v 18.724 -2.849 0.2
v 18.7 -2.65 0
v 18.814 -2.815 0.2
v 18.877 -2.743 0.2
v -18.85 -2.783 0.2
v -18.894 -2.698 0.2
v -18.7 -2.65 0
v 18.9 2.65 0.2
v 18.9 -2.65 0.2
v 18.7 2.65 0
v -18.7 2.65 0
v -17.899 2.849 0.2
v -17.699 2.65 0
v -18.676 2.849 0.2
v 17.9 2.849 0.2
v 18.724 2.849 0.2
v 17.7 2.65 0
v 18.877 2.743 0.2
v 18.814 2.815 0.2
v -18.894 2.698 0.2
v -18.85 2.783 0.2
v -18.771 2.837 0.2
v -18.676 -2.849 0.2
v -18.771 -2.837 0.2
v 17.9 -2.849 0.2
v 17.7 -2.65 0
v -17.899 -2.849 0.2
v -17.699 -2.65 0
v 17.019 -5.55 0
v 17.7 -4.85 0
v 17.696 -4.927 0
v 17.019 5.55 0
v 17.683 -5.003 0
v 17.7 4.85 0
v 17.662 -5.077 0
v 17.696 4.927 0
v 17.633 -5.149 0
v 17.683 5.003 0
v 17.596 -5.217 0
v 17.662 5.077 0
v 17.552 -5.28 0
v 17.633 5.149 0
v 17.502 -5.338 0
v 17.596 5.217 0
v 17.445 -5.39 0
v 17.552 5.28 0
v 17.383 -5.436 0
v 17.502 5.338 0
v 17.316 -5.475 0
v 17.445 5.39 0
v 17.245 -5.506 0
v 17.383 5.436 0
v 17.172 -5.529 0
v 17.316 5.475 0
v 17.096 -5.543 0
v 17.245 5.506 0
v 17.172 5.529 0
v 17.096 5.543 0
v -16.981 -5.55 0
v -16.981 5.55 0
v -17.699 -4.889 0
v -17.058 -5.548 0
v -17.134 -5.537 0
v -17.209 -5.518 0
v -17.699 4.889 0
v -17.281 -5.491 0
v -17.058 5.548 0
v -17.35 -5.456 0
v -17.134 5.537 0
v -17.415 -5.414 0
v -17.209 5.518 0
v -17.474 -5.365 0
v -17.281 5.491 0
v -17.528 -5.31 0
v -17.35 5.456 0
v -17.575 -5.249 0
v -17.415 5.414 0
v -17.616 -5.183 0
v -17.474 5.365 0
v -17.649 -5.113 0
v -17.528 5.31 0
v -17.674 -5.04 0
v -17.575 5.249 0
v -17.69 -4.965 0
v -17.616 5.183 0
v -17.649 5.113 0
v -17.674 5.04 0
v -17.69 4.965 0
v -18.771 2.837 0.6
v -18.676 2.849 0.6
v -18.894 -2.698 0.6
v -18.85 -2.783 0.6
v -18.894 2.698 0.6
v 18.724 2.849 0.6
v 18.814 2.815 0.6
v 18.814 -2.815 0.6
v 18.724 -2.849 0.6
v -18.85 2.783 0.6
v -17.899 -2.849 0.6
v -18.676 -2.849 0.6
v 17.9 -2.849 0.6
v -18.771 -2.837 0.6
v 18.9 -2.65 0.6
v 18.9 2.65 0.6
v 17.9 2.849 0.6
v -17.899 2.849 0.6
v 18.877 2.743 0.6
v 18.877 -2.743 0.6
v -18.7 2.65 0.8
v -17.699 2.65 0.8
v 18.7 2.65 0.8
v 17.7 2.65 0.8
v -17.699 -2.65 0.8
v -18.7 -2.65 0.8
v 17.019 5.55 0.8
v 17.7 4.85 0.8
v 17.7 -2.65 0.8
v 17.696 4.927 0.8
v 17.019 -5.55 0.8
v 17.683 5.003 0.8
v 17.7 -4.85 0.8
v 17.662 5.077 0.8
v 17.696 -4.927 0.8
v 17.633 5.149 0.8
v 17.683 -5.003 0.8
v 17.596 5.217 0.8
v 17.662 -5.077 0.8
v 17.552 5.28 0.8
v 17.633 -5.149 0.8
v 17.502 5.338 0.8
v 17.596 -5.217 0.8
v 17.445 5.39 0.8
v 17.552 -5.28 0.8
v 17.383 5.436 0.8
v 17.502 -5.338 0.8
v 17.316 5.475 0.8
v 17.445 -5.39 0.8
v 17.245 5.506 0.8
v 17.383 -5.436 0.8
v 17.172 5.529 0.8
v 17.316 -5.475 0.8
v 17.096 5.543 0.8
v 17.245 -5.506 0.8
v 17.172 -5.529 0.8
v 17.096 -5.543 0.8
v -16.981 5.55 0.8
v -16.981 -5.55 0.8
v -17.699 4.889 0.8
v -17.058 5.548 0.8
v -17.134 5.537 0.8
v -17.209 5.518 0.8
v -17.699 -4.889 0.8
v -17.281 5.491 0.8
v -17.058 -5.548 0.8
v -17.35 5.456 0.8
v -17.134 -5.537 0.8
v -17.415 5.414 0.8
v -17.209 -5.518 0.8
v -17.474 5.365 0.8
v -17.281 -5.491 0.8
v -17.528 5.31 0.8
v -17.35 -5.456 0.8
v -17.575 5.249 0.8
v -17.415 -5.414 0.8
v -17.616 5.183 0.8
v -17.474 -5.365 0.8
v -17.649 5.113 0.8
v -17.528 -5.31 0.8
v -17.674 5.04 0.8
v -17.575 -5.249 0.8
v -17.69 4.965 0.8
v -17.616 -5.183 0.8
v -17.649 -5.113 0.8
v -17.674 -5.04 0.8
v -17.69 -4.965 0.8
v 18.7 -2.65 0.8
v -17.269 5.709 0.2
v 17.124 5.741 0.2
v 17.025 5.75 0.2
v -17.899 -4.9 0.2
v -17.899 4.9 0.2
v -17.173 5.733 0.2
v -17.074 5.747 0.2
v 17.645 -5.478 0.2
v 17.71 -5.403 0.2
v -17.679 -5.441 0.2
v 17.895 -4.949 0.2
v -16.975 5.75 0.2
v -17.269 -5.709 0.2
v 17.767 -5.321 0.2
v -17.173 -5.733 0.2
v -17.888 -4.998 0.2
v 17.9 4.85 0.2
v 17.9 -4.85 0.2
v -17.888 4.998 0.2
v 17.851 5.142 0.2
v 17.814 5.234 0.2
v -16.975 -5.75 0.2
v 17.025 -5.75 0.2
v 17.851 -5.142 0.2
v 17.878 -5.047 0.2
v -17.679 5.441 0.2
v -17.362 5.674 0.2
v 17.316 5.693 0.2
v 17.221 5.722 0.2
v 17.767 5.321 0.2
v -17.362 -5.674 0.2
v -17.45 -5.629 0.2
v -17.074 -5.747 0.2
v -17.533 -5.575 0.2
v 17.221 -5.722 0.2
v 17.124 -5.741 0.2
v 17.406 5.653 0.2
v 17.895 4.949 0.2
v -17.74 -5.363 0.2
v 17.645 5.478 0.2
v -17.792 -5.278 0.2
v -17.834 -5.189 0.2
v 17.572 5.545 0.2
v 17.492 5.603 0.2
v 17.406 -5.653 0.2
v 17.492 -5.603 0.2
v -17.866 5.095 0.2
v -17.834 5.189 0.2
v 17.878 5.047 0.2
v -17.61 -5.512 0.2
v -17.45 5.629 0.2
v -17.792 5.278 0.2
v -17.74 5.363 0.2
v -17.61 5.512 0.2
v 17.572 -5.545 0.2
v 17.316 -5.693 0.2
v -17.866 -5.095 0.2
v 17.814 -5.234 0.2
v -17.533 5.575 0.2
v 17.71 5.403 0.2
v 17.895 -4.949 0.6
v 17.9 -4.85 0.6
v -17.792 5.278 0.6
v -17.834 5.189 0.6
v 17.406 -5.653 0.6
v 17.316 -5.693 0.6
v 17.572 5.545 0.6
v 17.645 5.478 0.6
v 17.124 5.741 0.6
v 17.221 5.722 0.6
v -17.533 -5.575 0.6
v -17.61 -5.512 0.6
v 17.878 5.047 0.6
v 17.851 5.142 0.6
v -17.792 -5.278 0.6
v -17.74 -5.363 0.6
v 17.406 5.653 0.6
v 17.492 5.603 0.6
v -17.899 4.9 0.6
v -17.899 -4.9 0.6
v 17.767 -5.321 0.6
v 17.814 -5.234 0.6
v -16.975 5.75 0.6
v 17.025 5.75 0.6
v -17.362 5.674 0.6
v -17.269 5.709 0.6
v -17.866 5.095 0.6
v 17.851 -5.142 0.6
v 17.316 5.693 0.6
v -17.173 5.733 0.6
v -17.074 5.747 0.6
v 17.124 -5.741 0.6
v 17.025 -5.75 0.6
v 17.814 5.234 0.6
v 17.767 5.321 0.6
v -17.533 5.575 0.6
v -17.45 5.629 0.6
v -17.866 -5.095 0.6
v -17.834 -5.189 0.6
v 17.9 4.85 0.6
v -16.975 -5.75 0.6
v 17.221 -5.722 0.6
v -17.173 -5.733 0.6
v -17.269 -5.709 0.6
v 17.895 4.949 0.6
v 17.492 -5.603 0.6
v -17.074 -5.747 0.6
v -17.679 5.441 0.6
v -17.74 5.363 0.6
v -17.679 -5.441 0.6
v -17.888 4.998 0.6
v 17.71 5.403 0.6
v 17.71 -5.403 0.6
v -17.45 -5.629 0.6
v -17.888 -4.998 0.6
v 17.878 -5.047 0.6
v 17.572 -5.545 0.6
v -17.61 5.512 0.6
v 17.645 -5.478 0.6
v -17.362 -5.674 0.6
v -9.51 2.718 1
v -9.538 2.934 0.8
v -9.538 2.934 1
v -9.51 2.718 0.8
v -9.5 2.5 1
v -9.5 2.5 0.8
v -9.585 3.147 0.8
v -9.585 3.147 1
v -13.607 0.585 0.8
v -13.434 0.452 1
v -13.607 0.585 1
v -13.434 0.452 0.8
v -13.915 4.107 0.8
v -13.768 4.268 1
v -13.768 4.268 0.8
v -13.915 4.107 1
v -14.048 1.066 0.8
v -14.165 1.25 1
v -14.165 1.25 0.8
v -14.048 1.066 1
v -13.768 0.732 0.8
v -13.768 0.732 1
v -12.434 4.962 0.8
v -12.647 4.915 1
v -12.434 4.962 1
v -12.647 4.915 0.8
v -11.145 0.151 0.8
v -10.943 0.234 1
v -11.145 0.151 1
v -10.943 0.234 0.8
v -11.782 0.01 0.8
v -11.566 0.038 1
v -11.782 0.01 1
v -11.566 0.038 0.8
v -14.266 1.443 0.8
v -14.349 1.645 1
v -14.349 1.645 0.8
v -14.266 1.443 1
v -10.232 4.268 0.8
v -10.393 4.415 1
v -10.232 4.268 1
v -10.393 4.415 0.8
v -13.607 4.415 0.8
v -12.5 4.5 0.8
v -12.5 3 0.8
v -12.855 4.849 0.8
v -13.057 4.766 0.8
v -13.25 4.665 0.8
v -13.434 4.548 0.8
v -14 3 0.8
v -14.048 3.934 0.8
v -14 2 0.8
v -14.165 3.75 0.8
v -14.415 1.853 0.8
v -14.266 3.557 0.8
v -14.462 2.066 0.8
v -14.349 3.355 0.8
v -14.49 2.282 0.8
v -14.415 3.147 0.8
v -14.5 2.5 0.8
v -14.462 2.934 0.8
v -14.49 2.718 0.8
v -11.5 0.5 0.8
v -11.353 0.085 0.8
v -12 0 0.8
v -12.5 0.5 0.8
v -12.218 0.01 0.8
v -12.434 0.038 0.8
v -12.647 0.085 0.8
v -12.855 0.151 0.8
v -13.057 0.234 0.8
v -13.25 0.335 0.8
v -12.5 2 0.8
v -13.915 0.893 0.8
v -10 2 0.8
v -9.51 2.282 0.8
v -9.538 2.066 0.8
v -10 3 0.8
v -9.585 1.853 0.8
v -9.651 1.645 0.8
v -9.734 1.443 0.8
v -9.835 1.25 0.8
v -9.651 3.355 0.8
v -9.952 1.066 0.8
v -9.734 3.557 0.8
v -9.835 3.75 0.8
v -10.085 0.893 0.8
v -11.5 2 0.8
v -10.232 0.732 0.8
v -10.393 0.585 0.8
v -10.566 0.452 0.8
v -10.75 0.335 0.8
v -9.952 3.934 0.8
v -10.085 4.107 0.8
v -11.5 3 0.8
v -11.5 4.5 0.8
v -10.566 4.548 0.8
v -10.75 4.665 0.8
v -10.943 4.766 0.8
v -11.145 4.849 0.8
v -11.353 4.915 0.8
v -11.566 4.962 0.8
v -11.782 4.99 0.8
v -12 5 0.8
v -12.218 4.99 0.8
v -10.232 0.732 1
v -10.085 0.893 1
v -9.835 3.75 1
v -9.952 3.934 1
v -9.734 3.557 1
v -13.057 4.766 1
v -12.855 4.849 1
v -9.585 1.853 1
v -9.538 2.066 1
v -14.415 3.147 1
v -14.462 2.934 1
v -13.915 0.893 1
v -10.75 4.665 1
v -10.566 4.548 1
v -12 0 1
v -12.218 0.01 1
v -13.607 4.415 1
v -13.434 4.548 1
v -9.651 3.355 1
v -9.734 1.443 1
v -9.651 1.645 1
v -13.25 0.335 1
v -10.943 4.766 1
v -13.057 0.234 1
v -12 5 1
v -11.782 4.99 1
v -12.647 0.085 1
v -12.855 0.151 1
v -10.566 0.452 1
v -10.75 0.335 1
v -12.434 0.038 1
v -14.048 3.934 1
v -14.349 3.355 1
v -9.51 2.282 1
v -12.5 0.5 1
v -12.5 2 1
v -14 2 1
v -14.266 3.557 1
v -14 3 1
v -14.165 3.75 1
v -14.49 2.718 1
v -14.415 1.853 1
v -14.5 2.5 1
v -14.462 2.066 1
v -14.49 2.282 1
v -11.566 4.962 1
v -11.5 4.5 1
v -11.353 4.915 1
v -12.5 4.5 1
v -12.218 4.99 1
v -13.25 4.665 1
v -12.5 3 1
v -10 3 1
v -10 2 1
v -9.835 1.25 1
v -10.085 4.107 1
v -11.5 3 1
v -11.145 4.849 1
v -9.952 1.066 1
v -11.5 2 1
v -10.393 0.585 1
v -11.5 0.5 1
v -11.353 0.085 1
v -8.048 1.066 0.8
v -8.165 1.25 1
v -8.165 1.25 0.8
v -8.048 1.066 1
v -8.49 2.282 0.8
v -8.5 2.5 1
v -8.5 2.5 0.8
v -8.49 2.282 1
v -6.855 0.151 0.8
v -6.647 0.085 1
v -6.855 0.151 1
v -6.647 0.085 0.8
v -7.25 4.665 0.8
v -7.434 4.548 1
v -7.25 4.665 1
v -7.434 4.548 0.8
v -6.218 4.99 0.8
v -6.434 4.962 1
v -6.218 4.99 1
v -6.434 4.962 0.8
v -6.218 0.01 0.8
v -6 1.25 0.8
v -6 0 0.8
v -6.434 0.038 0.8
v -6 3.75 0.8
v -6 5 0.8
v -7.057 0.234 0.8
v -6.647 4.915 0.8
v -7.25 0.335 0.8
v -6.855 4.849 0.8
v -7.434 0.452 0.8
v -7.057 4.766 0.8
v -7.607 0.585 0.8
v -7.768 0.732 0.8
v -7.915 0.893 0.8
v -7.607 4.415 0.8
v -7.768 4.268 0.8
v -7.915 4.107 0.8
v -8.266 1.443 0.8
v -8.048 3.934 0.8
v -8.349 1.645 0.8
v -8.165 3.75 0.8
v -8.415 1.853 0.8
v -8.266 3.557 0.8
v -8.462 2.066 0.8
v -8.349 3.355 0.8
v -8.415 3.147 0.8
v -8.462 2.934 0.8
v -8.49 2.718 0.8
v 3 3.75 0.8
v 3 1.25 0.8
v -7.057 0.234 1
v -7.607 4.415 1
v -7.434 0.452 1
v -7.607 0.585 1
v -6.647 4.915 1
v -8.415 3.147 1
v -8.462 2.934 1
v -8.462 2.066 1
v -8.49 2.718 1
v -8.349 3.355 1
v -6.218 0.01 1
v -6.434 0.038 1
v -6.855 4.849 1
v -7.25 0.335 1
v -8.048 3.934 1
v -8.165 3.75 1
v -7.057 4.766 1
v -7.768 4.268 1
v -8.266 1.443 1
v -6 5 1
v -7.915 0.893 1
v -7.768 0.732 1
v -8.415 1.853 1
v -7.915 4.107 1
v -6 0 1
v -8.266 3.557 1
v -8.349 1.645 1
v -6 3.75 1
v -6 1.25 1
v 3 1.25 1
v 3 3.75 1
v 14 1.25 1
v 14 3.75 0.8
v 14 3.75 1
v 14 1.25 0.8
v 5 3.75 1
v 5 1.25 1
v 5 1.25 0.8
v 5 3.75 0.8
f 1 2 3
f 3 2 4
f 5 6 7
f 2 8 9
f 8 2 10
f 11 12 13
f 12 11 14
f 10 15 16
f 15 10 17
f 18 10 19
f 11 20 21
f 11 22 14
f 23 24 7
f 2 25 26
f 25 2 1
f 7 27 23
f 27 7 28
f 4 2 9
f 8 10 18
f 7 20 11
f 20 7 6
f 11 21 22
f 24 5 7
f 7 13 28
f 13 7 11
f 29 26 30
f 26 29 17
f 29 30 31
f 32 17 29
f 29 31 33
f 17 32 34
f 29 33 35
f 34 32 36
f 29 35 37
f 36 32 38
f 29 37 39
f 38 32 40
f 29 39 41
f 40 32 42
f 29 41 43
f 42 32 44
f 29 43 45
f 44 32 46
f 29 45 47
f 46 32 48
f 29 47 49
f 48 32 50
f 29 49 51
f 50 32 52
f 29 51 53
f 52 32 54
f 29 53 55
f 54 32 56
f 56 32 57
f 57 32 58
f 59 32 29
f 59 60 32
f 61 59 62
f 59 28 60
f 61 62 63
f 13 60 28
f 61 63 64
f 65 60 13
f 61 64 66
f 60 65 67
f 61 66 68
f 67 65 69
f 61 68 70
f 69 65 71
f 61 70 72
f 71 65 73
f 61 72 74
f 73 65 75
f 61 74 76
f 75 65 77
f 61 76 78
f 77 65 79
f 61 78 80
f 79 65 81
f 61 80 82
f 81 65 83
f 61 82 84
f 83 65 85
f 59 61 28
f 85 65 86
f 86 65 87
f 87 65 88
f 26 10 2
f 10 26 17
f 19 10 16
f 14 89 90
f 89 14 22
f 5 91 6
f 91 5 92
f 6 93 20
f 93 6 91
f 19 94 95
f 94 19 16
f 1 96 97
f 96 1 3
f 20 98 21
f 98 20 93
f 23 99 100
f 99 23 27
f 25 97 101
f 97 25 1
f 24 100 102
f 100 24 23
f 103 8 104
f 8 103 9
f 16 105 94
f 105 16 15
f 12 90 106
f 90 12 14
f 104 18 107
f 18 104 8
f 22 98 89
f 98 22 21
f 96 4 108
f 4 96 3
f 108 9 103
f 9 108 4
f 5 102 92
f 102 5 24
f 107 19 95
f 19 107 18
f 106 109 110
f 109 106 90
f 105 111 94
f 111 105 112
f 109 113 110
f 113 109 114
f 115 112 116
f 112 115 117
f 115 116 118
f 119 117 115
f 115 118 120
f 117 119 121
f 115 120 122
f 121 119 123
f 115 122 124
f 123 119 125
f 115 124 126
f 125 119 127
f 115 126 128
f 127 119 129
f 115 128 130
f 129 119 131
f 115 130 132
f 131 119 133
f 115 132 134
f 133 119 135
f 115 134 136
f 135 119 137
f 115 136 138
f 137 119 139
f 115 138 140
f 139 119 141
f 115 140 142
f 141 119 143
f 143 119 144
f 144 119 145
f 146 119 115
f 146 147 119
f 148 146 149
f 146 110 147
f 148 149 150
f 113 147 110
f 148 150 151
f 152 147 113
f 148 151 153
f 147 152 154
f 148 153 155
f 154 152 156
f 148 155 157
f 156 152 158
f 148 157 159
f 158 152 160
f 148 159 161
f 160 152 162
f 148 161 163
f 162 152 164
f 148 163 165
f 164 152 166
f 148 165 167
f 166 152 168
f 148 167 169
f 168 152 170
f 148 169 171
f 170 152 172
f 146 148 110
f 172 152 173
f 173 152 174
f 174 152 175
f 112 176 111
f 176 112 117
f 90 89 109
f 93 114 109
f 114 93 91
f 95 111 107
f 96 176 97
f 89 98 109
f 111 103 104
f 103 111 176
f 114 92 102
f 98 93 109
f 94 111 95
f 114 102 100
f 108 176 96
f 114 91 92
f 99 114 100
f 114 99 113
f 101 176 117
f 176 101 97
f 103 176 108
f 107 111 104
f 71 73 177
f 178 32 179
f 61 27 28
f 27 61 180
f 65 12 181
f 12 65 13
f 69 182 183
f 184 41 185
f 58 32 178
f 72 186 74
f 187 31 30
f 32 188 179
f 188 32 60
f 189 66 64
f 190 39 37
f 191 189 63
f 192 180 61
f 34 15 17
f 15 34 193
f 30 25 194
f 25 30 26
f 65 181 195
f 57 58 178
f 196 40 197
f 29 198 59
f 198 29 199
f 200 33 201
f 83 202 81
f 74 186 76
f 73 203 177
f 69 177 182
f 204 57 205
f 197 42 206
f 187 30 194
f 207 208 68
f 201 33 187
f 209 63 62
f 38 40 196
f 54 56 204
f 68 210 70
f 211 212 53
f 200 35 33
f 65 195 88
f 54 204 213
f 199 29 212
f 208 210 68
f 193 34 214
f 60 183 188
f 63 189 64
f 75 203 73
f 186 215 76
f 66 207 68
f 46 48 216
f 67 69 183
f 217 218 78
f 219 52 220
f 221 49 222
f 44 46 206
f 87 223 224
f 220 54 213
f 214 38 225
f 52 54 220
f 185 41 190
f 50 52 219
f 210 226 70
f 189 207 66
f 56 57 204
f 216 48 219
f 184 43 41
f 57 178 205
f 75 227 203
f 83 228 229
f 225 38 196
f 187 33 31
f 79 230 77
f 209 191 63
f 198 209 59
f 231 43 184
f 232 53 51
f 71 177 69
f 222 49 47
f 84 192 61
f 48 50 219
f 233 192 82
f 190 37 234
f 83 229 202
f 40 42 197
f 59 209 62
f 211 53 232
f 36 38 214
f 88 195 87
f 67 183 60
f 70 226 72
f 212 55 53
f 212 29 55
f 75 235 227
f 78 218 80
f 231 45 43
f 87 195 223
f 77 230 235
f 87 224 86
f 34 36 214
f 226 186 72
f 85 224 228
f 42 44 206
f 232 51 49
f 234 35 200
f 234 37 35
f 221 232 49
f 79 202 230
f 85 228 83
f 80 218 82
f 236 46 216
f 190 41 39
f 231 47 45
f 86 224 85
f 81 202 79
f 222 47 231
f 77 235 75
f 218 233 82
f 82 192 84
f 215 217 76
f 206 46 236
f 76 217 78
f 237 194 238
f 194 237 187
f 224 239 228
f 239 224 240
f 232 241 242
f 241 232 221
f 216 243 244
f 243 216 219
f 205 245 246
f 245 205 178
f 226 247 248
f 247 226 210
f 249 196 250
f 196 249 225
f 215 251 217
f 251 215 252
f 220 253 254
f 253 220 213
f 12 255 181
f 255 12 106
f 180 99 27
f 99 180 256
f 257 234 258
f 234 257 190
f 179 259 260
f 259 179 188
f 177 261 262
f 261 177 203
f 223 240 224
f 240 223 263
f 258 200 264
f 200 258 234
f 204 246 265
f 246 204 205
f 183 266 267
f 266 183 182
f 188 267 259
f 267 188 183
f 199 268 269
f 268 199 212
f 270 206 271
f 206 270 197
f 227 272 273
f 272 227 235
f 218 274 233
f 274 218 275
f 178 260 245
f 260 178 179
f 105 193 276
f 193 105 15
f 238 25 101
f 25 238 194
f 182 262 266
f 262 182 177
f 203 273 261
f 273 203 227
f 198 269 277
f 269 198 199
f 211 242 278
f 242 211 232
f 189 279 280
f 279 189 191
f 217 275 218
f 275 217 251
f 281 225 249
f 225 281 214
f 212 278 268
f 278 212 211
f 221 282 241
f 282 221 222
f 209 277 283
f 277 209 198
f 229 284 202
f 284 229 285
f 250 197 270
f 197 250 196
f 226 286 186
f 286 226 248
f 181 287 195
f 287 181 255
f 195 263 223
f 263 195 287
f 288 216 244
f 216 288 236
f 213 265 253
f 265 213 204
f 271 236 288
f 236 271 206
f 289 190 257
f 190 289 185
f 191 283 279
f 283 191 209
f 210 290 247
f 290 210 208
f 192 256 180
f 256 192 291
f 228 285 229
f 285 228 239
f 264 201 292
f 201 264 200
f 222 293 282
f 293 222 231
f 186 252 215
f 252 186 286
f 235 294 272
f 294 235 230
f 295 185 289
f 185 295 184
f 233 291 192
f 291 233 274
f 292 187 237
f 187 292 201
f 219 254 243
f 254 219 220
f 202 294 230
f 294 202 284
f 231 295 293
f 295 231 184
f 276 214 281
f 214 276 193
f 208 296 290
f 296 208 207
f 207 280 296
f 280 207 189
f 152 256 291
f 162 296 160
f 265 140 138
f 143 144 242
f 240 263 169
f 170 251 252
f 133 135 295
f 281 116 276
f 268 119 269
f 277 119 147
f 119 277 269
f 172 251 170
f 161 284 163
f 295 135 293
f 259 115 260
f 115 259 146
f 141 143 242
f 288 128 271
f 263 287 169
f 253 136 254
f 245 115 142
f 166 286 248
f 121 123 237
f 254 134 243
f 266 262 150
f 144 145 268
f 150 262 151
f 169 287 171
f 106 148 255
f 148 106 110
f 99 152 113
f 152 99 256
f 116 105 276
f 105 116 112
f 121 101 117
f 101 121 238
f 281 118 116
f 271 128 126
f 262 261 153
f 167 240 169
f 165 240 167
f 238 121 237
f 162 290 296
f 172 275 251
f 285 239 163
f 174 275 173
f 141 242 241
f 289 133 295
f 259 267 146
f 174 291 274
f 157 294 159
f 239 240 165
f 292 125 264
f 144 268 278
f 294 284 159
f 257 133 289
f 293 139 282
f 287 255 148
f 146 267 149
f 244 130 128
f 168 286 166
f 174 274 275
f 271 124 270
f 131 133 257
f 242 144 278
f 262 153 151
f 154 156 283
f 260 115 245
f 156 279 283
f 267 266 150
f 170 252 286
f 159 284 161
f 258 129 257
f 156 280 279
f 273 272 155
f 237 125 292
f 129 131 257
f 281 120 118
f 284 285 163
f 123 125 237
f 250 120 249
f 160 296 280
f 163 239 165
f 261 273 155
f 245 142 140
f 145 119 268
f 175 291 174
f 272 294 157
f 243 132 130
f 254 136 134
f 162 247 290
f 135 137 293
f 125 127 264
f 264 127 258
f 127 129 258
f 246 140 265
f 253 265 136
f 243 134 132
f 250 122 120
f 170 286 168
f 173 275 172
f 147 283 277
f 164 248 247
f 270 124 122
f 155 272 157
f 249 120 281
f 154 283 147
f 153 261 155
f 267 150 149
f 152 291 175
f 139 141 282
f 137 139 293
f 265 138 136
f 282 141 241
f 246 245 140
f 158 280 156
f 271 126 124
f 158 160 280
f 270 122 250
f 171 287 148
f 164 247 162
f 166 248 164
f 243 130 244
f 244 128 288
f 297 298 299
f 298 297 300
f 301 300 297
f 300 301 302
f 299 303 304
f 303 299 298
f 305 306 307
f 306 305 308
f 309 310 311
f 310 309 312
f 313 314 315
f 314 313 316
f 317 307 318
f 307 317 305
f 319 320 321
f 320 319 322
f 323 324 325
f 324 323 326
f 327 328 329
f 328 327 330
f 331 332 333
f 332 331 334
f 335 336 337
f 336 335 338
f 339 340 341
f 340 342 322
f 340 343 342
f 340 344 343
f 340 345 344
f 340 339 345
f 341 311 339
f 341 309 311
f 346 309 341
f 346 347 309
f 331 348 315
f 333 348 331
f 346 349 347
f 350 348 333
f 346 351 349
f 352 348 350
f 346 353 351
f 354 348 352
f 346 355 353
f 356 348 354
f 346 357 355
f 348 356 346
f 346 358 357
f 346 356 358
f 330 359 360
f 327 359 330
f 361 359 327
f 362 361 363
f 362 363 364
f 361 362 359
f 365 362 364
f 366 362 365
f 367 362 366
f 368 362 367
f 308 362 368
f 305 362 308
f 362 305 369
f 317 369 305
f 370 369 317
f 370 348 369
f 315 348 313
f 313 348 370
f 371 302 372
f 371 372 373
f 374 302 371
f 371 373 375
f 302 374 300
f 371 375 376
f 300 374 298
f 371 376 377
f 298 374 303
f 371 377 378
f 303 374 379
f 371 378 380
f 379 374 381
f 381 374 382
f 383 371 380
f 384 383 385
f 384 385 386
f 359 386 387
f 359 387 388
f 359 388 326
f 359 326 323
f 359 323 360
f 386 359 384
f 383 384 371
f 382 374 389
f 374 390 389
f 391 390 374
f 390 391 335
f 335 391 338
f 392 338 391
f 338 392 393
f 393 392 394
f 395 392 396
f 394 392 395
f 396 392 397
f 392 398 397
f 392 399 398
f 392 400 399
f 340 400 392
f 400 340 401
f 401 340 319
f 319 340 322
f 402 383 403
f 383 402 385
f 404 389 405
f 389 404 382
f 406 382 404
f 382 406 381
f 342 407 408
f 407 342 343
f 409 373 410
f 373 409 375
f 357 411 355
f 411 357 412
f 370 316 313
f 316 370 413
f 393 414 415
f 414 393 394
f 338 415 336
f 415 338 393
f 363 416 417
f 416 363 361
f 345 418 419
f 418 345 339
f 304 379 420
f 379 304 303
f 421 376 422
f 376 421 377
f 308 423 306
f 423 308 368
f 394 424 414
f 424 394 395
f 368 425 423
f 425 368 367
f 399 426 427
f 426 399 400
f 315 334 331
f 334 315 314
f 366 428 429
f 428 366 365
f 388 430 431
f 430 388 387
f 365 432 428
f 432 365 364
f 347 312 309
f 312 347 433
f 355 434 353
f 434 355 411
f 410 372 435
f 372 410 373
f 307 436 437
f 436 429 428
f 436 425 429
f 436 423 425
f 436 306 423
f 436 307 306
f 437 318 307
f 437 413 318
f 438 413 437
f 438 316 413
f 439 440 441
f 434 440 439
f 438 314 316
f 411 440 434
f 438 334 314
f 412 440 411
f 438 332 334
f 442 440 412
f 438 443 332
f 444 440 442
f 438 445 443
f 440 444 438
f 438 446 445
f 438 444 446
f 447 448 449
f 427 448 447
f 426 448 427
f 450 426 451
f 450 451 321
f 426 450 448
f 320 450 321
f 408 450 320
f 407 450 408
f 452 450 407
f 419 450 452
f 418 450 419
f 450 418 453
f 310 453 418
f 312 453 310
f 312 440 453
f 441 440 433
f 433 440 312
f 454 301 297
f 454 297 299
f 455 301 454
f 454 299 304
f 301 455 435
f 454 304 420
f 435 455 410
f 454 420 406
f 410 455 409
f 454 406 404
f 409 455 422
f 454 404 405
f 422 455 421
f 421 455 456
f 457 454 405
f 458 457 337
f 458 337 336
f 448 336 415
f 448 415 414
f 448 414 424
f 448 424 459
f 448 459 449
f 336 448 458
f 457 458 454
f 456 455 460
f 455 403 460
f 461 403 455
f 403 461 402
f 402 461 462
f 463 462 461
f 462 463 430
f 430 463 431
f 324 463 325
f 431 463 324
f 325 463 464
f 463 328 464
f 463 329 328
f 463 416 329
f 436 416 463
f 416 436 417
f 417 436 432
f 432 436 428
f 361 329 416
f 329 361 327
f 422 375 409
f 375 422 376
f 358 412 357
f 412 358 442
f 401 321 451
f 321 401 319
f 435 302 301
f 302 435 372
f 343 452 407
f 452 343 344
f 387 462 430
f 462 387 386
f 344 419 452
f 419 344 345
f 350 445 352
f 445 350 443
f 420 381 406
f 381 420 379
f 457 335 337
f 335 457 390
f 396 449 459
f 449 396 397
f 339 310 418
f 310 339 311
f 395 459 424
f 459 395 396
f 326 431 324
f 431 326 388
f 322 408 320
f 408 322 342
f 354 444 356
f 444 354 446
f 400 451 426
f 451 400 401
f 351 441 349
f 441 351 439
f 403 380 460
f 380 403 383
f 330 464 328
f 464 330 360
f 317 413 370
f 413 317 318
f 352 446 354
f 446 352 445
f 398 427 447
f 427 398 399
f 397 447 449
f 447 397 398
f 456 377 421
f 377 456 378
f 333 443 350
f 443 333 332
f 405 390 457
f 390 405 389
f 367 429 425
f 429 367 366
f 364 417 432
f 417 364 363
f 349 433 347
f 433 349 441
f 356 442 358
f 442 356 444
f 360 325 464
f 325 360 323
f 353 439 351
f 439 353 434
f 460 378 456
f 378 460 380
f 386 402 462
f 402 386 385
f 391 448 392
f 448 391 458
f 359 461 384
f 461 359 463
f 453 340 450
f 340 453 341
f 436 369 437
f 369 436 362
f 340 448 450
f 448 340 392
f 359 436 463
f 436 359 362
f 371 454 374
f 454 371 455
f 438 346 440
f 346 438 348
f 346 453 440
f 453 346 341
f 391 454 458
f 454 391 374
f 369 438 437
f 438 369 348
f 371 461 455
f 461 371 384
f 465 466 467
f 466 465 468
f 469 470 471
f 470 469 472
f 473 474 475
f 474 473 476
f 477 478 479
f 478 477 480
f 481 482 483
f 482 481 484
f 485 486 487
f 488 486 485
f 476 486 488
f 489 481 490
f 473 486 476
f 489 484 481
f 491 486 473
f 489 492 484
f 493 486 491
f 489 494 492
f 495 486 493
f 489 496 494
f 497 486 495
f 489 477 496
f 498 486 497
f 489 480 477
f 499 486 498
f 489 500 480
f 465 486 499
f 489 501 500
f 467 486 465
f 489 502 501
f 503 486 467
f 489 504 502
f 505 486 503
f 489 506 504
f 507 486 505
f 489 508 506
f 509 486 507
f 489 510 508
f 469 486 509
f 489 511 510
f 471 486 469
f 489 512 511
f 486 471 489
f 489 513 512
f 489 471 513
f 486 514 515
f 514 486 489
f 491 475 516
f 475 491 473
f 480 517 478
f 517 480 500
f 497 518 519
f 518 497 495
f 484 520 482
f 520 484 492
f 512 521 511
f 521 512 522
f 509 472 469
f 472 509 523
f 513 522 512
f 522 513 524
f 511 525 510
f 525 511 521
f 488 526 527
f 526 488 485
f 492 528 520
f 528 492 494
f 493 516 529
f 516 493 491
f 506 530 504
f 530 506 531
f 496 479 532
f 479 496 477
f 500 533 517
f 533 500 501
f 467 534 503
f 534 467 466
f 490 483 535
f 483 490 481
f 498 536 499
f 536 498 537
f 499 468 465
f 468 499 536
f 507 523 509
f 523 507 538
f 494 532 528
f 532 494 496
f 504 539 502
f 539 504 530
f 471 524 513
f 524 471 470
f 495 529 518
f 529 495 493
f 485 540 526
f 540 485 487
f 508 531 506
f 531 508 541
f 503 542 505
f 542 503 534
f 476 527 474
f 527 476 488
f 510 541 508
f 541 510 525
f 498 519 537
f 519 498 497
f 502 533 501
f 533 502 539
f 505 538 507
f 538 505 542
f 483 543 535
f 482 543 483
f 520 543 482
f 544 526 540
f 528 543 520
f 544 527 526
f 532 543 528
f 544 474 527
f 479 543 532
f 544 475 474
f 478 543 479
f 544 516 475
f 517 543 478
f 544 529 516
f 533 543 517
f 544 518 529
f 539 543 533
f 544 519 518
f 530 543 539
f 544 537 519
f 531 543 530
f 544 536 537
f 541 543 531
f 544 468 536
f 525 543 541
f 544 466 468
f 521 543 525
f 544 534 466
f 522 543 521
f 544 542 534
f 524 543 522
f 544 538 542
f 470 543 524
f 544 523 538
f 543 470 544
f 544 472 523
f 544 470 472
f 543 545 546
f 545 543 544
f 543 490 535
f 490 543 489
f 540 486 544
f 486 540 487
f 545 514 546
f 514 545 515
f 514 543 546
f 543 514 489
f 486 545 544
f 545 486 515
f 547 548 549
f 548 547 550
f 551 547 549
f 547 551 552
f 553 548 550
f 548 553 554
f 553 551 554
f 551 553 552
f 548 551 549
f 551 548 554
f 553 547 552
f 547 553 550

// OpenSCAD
/////////////////////////////////////////////
// Custom label generator by Laurens Guijt //
/////////////////////////////////////////////

//////////////////////////////////////////////////////////////
//                   BATCH LABEL DATA                      //
//////////////////////////////////////////////////////////////

batch_label_data = [
    ["Dome head bolt", "M2", 8],
    ["Dome head bolt", "M2", 12],
    ["Dome head bolt", "M2", 16],
    ["Dome head bolt", "M2", 20],
    ["Dome head bolt", "M3", 8],
    ["Dome head bolt", "M3", 12],
    ["Dome head bolt", "M3", 16],
    ["Dome head bolt", "M3", 20],
    ["Dome head bolt", "M4", 8],
    ["Dome head bolt", "M4", 12],
    ["Dome head bolt", "M4", 16],
    ["Dome head bolt", "M4", 20],
    ["Dome head bolt", "M5", 8],
    ["Dome head bolt", "M5", 12],
    ["Dome head bolt", "M5", 16],
    ["Dome head bolt", "M5", 20],
    ["Standard nut", "M2", 0],
    ["Standard nut", "M3", 0],
    ["Standard nut", "M4", 0],
    ["Standard nut", "M5", 0],
    ["Standard washer", "M2", 0],
    ["Standard washer", "M3", 0],
    ["Standard washer", "M4", 0],
    ["Standard washer", "M5", 0],
];


/* [Part customization] */
Component = "phillips head bolt"; // [phillips head bolt, phillips wood screw, Wall Anchor, Torx wood screw, Phillips head countersunk, Socket head bolt, Hex head bolt, Dome head bolt, Flat Head countersunk, Standard washer, Spring washer, Standard nut, Lock nut, Heat set inserts, Torx head bolt, Countersunk Torx head bolt, None, Custom Text]
diameter = "M4";  // free text, e.g. "1/4-20", "#8-32"
hardware_length = 24;

/* [Label customization] */
Y_units       = 1;          // [1,2,3]
Label_color   = "#000000";  // color
Content_color = "#FFFFFF";  // color

/* [Text customization] */
// Font type
text_font = "Noto Sans SC:Noto Sans China"; // [HarmonyOS Sans, Inter, Inter Tight, Lora, Merriweather Sans, Montserrat, Noto Sans, Noto Sans SC:Noto Sans China, Noto Sans KR, Noto Emoji, Nunito, Nunito Sans, Open Sans, Open Sans Condensed, Oswald, Playfair Display, Plus Jakarta Sans, Raleway, Roboto, Roboto Condensed, Roboto Flex, Roboto Mono, Roboto Serif, Roboto Slab, Rubik, Source Sans 3, Ubuntu Sans, Ubuntu Sans Mono, Work Sans]
// Font Style
Font_Style = "Bold"; // [Regular,Black,Bold,ExtraBol,ExtraLight,Light,Medium,SemiBold,Thin,Italic,Black Italic,Bold Italic,ExtraBold Italic,ExtraLight Italic,Light Italic,Medium Italic,SemiBold Italic,Thin Italic]
// Flush text requires an AMS
text_type  = "Raised Text";                  // [Raised Text, Flush Text]
//Font size
text_size  = 4.2;
// Custom text (only used when Component is set to "Custom Text")
custom_text = "Custom";

/* [Preview (UI only)] */
// Enables icon-only preview output for the UI.
preview_mode = false;
// Draw a red bounds box for validation.
preview_show_bounds = true;
// Target frame size used for scaling (keep width/height ratio in sync with preview image).
preview_target_width = 24;
preview_target_height = 10;

/* [Batch exporter] */
// Enable this feature if you want generate a lot of different labels at once.
// In the code editor on the left side edit the batch_label_data to the parts desired.
// Make sure to type the names the same as the dropdowns above
batch_export = false; // false

/* [Settings for nerds] */
width    = 11.5;
height   = 0.8;
radius   = 0.9;
champfer = 0.2;
$fs      = 0.1;
$fa      = 5;

/* [Hidden] */
Font        = str(text_font, ":style=", Font_Style);
length      = getDimensions(Y_units);
text_height = (text_type == "Raised Text") ? 0.2 : 0.01;


//////////////////////////////////////////////////////////////
//               MAIN SWITCH: Preview vs. Label            //
//////////////////////////////////////////////////////////////
if (preview_mode) {
    preview_icon(Component, diameter, hardware_length, Y_units);
} else if (batch_export) {
    generate_multiple_labels();
} else {
    label(
        length          = length, 
        width           = width, 
        height          = height,
        radius          = radius,
        champfer        = champfer,
        Component       = Component,
        diameter        = diameter,
        hardware_length = hardware_length
    );
}

//////////////////////////////////////////////////////////////
//               Dimension Helper Function                 //
//////////////////////////////////////////////////////////////
function getDimensions(Y_units) =
    (Y_units == 1) ? 35.8 :
    (Y_units == 2) ? 77.8 :
    (Y_units == 3) ? 119.8 :
    0;


//////////////////////////////////////////////////////////////
//            BATCH LABEL GENERATION (Multiple)            //
//////////////////////////////////////////////////////////////
module generate_multiple_labels() {
    columns           = 3;              
    horizontal_offset = length + 3;     
    vertical_offset   = 12;            

    for (i = [0 : len(batch_label_data) - 1]) {
        label_parameters = batch_label_data[i];
        
        row = i / columns;
        col = i % columns;
        
        translate([col * horizontal_offset, row * -vertical_offset, 0]) {
            label(
                length          = length, 
                width           = width, 
                height          = height,
                radius          = radius,
                champfer        = champfer,
                Component       = label_parameters[0],
                diameter        = label_parameters[1],
                hardware_length = label_parameters[2]
            );
        }
    }
}


//////////////////////////////////////////////////////////////
//         MAIN LABEL MODULE (base + icons/text)           //
//////////////////////////////////////////////////////////////
module label(length, width, height, radius, champfer, Component, diameter, hardware_length) {
    color(Label_color) {
        labelbase(length, width, height, radius, champfer);
    }
    color(Content_color) {
        choose_Part_version(Component, hardware_length, width, height, diameter);
    }
}


//////////////////////////////////////////////////////////////
//           DISPATCH: Which Part Icon to Draw?            //
//////////////////////////////////////////////////////////////
module choose_Part_version(Part_version, hardware_length, width, height, diameter) {
    if (Part_version == "None") {
        // Don't draw any icon or text
    } else if (Part_version == "Custom Text") {
        // Don't draw any text
    } else if (Part_version == "Socket head bolt") {
        Socket_head(hardware_length, width, height);

    } else if (Part_version == "Torx head bolt") {
        Torx_head(hardware_length, width, height);

    } else if (Part_version == "Countersunk Torx head bolt") {
        Countersunk_Torx_head(hardware_length, width, height);

    } else if (Part_version == "Hex head bolt") {
        Hex_head(hardware_length, width, height);

    } else if (Part_version == "Flat Head countersunk") {
        Countersunk_socket_head(hardware_length, width, height);

    } else if (Part_version == "Dome head bolt") {
        Dome_head(hardware_length, width, height);

    } else if (Part_version == "phillips head bolt") {
        Phillips_head(hardware_length, width, height);

    } else if (Part_version == "Phillips head countersunk") {
        Phillips_head_countersunk(hardware_length, width, height);

    } else if (Part_version == "Standard washer") {
        standard_washer(width, height);

    } else if (Part_version == "Spring washer") {
        spring_washer(width, height);

    } else if (Part_version == "Standard nut") {
        standard_Nut(width, height);

    } else if (Part_version == "Lock nut") {
        lock_Nut(width, height);

    } else if (Part_version == "Heat set inserts") {
        Heat_Set_Inserts(hardware_length, width, height);
    } else if (Part_version == "Wall Anchor") {
        Wall_Anchor(hardware_length, width, height);

    } else if (Part_version == "phillips wood screw") {
        Phillips_Wood_Screw(hardware_length, width, height);

    } else if (Part_version == "Torx wood screw") {
        Torx_Wood_Screw(hardware_length, width, height);
    }
}


//////////////////////////////////////////////////////////////
//              ICON ONLY DISPATCH (PREVIEW)               //
//////////////////////////////////////////////////////////////
module choose_Part_icon(Part_version, hardware_length, width, height, diameter) {
    if (Part_version == "None") {
        translate([0, 0, height])
            linear_extrude(height=text_height)
                text(str(diameter, "x", hardware_length),
                     size   = text_size,
                     font   = Font,
                     valign = "center",
                     halign = "center");
    } else if (Part_version == "Custom Text") {
        translate([0, 0, height])
            linear_extrude(height=text_height)
                text(custom_text,
                     size   = text_size,
                     font   = Font,
                     valign = "center",
                     halign = "center");
    } else if (Part_version == "Socket head bolt") {
        Socket_head(hardware_length, width, height);
    } else if (Part_version == "Torx head bolt") {
        Torx_head(hardware_length, width, height);
    } else if (Part_version == "Countersunk Torx head bolt") {
        Countersunk_Torx_head(hardware_length, width, height);
    } else if (Part_version == "Hex head bolt") {
        Hex_head(hardware_length, width, height);
    } else if (Part_version == "Flat Head countersunk") {
        Countersunk_socket_head(hardware_length, width, height);
    } else if (Part_version == "Dome head bolt") {
        Dome_head(hardware_length, width, height);
    } else if (Part_version == "phillips head bolt") {
        Phillips_head(hardware_length, width, height);
    } else if (Part_version == "Phillips head countersunk") {
        Phillips_head_countersunk(hardware_length, width, height);
    } else if (Part_version == "Standard washer") {
        standard_washer(width, height);
    } else if (Part_version == "Spring washer") {
        spring_washer(width, height);
    } else if (Part_version == "Standard nut") {
        standard_Nut(width, height);
    } else if (Part_version == "Lock nut") {
        lock_Nut(width, height);
    } else if (Part_version == "Heat set inserts") {
        Heat_Set_Inserts(hardware_length, width, height);
    } else if (Part_version == "Wall Anchor") {
        Wall_Anchor(hardware_length, width, height);
    } else if (Part_version == "phillips wood screw") {
        Phillips_Wood_Screw(hardware_length, width, height);
    } else if (Part_version == "Torx wood screw") {
        Torx_Wood_Screw(hardware_length, width, height);
    }
}


//////////////////////////////////////////////////////////////
//              PREVIEW ICON (AUTO SCALE)                  //
//////////////////////////////////////////////////////////////
function _clamp(value, low, high) =
    (value < low) ? low :
    (value > high) ? high :
    value;

function _stem_len(hardware_length, y_units) =
    _clamp(hardware_length, 0, 20 * y_units);

function _wood_stem_len(hardware_length, y_units) =
    _clamp(hardware_length - 1.5, 0, 20 * y_units);

function _bolt_bounds(stem_start, stem_len, head_radius, y_min, y_max, extra_max = 0) =
    [ -head_radius, y_min, max(stem_start + stem_len, extra_max), y_max ];

function _wood_bounds(stem_start, stem_len, head_radius, y_min, y_max, extra_max = 0, tip_len = 2) =
    [ -head_radius, y_min, max(stem_start + stem_len + tip_len, extra_max), y_max ];

function _text_bounds(text_value) =
    let(chars = max(1, len(text_value)),
        width_est = text_size * 0.6 * chars,
        height_est = text_size)
    [ -width_est / 2, -height_est / 2, width_est / 2, height_est / 2 ];

function icon_bounds(part, hardware_length, y_units, diameter, custom_text) =
    (part == "Socket head bolt") ? _bolt_bounds(7, _stem_len(hardware_length, y_units), 2.5, 0, 5) :
    (part == "Torx head bolt") ? _bolt_bounds(7, _stem_len(hardware_length, y_units), 2.5, 0, 5) :
    (part == "Countersunk Torx head bolt") ? _bolt_bounds(7, _stem_len(hardware_length, y_units), 2.5, 0, 5, 9.6) :
    (part == "Hex head bolt") ? _bolt_bounds(6, _stem_len(hardware_length, y_units), 2.5, 0, 5) :
    (part == "Flat Head countersunk") ? _bolt_bounds(5, _stem_len(hardware_length, y_units), 2.5, 0, 5, 8) :
    (part == "Dome head bolt") ? _bolt_bounds(6, _stem_len(hardware_length, y_units), 2.5, 0, 5, 8.5) :
    (part == "phillips head bolt") ? _bolt_bounds(6, _stem_len(hardware_length, y_units), 2.5, 0, 5, 8.5) :
    (part == "Phillips head countersunk") ? _bolt_bounds(5, _stem_len(hardware_length, y_units), 2.5, 0, 5, 8) :
    (part == "phillips wood screw") ? _wood_bounds(5, _wood_stem_len(hardware_length, y_units), 2.5, 0, 5, 8, 2) :
    (part == "Torx wood screw") ? _wood_bounds(5, _wood_stem_len(hardware_length, y_units), 2.5, 0, 5, 8, 2) :
    (part == "Standard washer") ? [-1.5, 0, 5, 5] :
    (part == "Spring washer") ? [-1.5, 0, 5, 5] :
    (part == "Standard nut") ? [-2.5, 0, 6.8, 5] :
    (part == "Lock nut") ? [-2.5, 0, 7.5, 5] :
    (part == "Heat set inserts") ? [-2.5, 0, 10, 5] :
    (part == "Wall Anchor") ? [-4, 0.5, 12, 4.5] :
    (part == "None") ? _text_bounds(str(diameter, "x", hardware_length)) :
    (part == "Custom Text") ? _text_bounds(custom_text) :
    _bolt_bounds(7, _stem_len(hardware_length, y_units), 2.5, 0, 5);

module preview_icon(component, diameter, hardware_length, y_units) {
    bounds = icon_bounds(component, hardware_length, y_units, diameter, custom_text);
    icon_w = bounds[2] - bounds[0];
    icon_h = bounds[3] - bounds[1];
    scale_factor = min(preview_target_width / icon_w, preview_target_height / icon_h);
    center_x = (bounds[0] + bounds[2]) / 2;
    center_y = (bounds[1] + bounds[3]) / 2;

    scale([scale_factor, scale_factor, 1]) {
        translate([-center_x, -center_y, 0]) {
            color(Content_color)
                choose_Part_icon(component, hardware_length, width, 0, diameter);
        }

        if (preview_show_bounds) {
            color("red")
                linear_extrude(height=text_height)
                    square([icon_w, icon_h], center=true);
        }
    }
}


//////////////////////////////////////////////////////////////
//    NUTS / WASHERS / INSERTS (Top View + Side View)      //
//////////////////////////////////////////////////////////////
module standard_Nut(width, height, vertical_offset = 2.5) {
    translate([-2.5, vertical_offset, height]) {
        // top view
        difference() {    
            cylinder(h=text_height, d=5, $fn=6);
            cylinder(h=text_height, d=3);
        }
        // side view
        translate([4, -2.5, 0])
            cube([2.8, 5, text_height]);
    }
}

module lock_Nut(width, height, vertical_offset = 2.5) {
    translate([-2.5, vertical_offset, height]) {
        // top view
        difference() {    
            cylinder(h=text_height, d=5, $fn=6);
            cylinder(h=text_height, d=3);
        }
        // side view
        translate([4, -2.5, 0])
            cube([2.8, 5, text_height]);

        translate([4, -2, 0])
            cube([3.5, 4, text_height]);
    }
}

module standard_washer(width, height, vertical_offset = 2.5) {
    translate([-1.5, vertical_offset, height]) {
        // top view
        difference() {
            cylinder(h=text_height, d=5);
            cylinder(h=text_height, d=3);
        }
        // side view
        translate([4, -2.5, 0])
            cube([1, 5, text_height]);
    }
}

module spring_washer(width, height, vertical_offset = 2.5) {
    translate([-1.5, vertical_offset, height]) {
        // top view (split ring)
        difference() {
            cylinder(h=text_height, d=5);
            cylinder(h=text_height, d=3);
            cube([5, 0.8, text_height]);
        }
        // side view
        translate([4, -2.5, 0])
            cube([1, 5, text_height]);
    }
}

module Heat_Set_Inserts(hardware_length, width, height, vertical_offset = 2.5) {
    translate([-4, vertical_offset, height]) {
        // top view
        difference() {
            union() {
                cylinder(h=text_height, r=2.5, $fn=5);
                rotate(36) cylinder(h=text_height, r=2.5, $fn=5);
            }
            cylinder(h=text_height, r=1.5, $fn=80);
        }
        // side pattern
        translate([4, -2, 0])    cube([1, 4, text_height]);
        translate([5, -2.5, 0])  cube([2, 5, text_height]);
        translate([7, -2, 0])    cube([1, 4, text_height]);
        translate([8, -2.5, 0])  cube([2, 5, text_height]);
    }
}

module Wall_Anchor(hardware_length, width, height, vertical_offset = 2.5) {
    translate([-4, vertical_offset, height]) {
        difference() {
            // 1) The main geometry, combined via union()
            union() {
                // The extruded polygons
                linear_extrude(height = text_height)
                    translate([-2,  0, 0])
                    polygon(points=[[0,2],[-2,1],[-2,-1],[0,-2]], paths=[[0,1,2,3]]);
                linear_extrude(height = text_height)
                    translate([-0.5, 0, 0])
                    polygon(points=[[0,2],[-1.5,1.5],[-1.5,-1.5],[0,-2]], paths=[[0,1,2,3]]);
                linear_extrude(height = text_height)
                    translate([1,    0, 0])
                    polygon(points=[[0,2],[-1.5,1.5],[-1.5,-1.5],[0,-2]], paths=[[0,1,2,3]]);
                linear_extrude(height = text_height)
                    translate([2.5,  0, 0])
                    polygon(points=[[0,2],[-1.5,1.5],[-1.5,-1.5],[0,-2]], paths=[[0,1,2,3]]);
                linear_extrude(height = text_height)
                    translate([4,    0, 0])
                    polygon(points=[[0,2],[-1.5,1.5],[-1.5,-1.5],[0,-2]], paths=[[0,1,2,3]]);

                // A couple more cubes for shape
                translate([4, -1.5, 0])
                    cube([7, 3, text_height]);
                translate([11, -2, 0])
                    cube([1, 4, text_height]);
            }

            // 2) The cutting object: this is subtracted (removed) from the union above
            translate([-4, -0.25, 0])
                cube([10, 0.5, 3]);
        }
    }
}



//////////////////////////////////////////////////////////////
//            BOLT ICONS (Top View + Side View)            //
//////////////////////////////////////////////////////////////

// "drawBoltStem" for typical bolts/screws
module drawBoltStem(hardware_length, text_height, start=[7, -1.25, 0], thickness=2.5) {
    // The max length scales with Y_units; e.g. Y_units=1 => 20, Y_units=2 => 40, etc.
    maxLen = 20 * Y_units;

    // Final length is either the actual hardware_length or the scaled maxLen
    finalLen = (hardware_length > maxLen) ? maxLen : hardware_length;

    if (hardware_length > maxLen) {
        // For bolts exceeding maxLen, show a "split" icon
        gapBetween    = 2;  // small gap to indicate it's a longer bolt
        segmentLength = (finalLen - gapBetween) / 2;  // split finalLen into two segments

        // First partial segment
        translate(start)
            cube([segmentLength, thickness, text_height]);

        // Second partial segment
        translate([
            start[0] + segmentLength + gapBetween, 
            start[1], 
            start[2]
        ])
            cube([segmentLength, thickness, text_height]);

    } else {
        // If the bolt length is <= maxLen, draw one solid stem
        translate(start)
            cube([finalLen, thickness, text_height]);
    }
}

// Torx star shape for top view
module Torx_star(points, point_len, height=2, rnd=0.1) {
    fn=25;
    point_deg = 360 / points;
    point_deg_adjusted = point_deg + (-point_deg / 2);

    for (i = [0 : points - 1]) {
        rotate([0, 0, i * point_deg])
        translate([0, -point_len, 0])
            point(point_deg_adjusted, point_len, rnd, height, fn);
    }  
    
    module point(deg, leng, rnd, height, fn=25) {
    hull() {
        cylinder(height, d=rnd, $fn=fn); // Base cylinder at the center
        rotate([0, 0, -deg / 2])
            translate([0, leng, 0]) cylinder(height, d=rnd); // Left edge
        rotate([0, 0, deg / 2])
            translate([0, leng, 0]) cylinder(height, d=rnd); // Right edge
    }
}
}


// Torx head bolt
module Torx_head(hardware_length, width, height, vertical_offset = 2.5) {
    display_length = (hardware_length > 20) ? 20 : hardware_length;
    translate([-display_length/2 - 2, vertical_offset, height]) {
        // top view
        difference() {
            cylinder(h=text_height, d=5);
            Torx_star(6, 2, height=2, rnd=0.1);
        }
        // side view
        translate([3, -2.5, 0])
            cube([4, 5, text_height]);

        // stem
        drawBoltStem(hardware_length, text_height, [7, -1.25, 0]);
    }
}

// Countersunk Torx
module Countersunk_Torx_head(hardware_length, width, height, vertical_offset = 2.5) {
    display_length = (hardware_length > 20) ? 20 : hardware_length;
    translate([-display_length/2 - 2, vertical_offset, height]) {
        // top view
        difference() {
            cylinder(h=text_height, d=5);
            Torx_star(6, 2, height=2, rnd=0.1);
        }
        // countersunk side
        translate([6.6, 0, 0])
            cylinder(r=3, h=text_height, $fn=3);

        // stem
        drawBoltStem(hardware_length, text_height, [7, -1.25, 0]);
    }
}

// Socket head
module Socket_head(hardware_length, width, height, vertical_offset = 2.5) {
    display_length = (hardware_length > 20) ? 20 : hardware_length;
    translate([-display_length/2 - 2, vertical_offset, height]) {
        // top view
        difference() {
            cylinder(h=text_height, d=5);
            cylinder(h=text_height, r=1.6, $fn=6);
        }
        // side view
        translate([3, -2.5, 0])
            cube([4, 5, text_height]);

        // stem
        drawBoltStem(hardware_length, text_height, [7, -1.25, 0]);
    }
}

// Hex head
module Hex_head(hardware_length, width, height, vertical_offset = 2.5) {
    display_length = (hardware_length > 20) ? 20 : hardware_length;
    translate([-display_length/2 - 2, vertical_offset, height]) {
        // top view
        cylinder(h=text_height, d=5, $fn=6);
        // side view
        translate([3, -2.5, 0])
            cube([3, 5, text_height]);

        // stem
        drawBoltStem(hardware_length, text_height, [6, -1.25, 0]);
    }
}

// Countersunk socket head
module Countersunk_socket_head(hardware_length, width, height, vertical_offset = 2.5) {
    display_length = (hardware_length > 20) ? 20 : hardware_length;
    translate([-display_length/2 - 2, vertical_offset, height]) {
        // top view
        difference() {
            cylinder(h=text_height, d=5);
            cylinder(h=text_height, r=1.6, $fn=6);
        }
        // countersunk side
        translate([5, 0, 0])
            cylinder(r=3, h=text_height, $fn=3);

        // stem
        drawBoltStem(hardware_length, text_height, [5, -1.25, 0]);
    }
}

// Dome head
module Dome_head(hardware_length, width, height, vertical_offset = 2.5) {
    display_length = (hardware_length > 20) ? 20 : hardware_length;
    translate([-display_length/2 - 2, vertical_offset, height]) {
        // top view
        difference() {
            cylinder(h=text_height, d=5);
            cylinder(h=text_height, r=1.6, $fn=6);
        }
        // side view
        translate([6, 0, 0]) {
            difference() {
                cylinder(h=text_height, d=5);
                translate([0, -2.5, 0])
                    cube([4, 5, text_height]);
            }
        }
        // stem
        drawBoltStem(hardware_length, text_height, [6, -1.25, 0]);
    }
}

// Phillips head
module Phillips_head(hardware_length, width, height, vertical_offset = 2.5) {
    display_length = (hardware_length > 20) ? 20 : hardware_length;
    translate([-display_length/2 - 2, vertical_offset, height]) {
        // top view
        difference() {
            cylinder(h=text_height, d=5);
            translate([-0.5, -2, 0])
                cube([1, 4, text_height]);
            translate([-2, -0.5, 0])
                cube([4, 1, text_height]);
        }
        // side view
        translate([6, 0, 0]) {
            difference() {
                cylinder(h=text_height, d=5);
                translate([0, -2.5, 0])
                    cube([4, 5, text_height]);
            }
        }
        // stem
        drawBoltStem(hardware_length, text_height, [6, -1.25, 0]);
    }
}

// Phillips countersunk
module Phillips_head_countersunk(hardware_length, width, height, vertical_offset = 2.5) {
    display_length = (hardware_length > 20) ? 20 : hardware_length;
    translate([-display_length/2 - 2, vertical_offset, height]) {
        // top view
        difference() {
            cylinder(h=text_height, d=5);
            translate([-0.5, -2, 0])
                cube([1, 4, text_height]);
            translate([-2, -0.5, 0])
                cube([4, 1, text_height]);
        }
        // countersunk side
        translate([5, 0, 0])
            cylinder(r=3, h=text_height, $fn=3);

        // stem
        drawBoltStem(hardware_length, text_height, [5, -1.25, 0]);
    }
}


//Philips wood screw 
module Phillips_Wood_Screw(hardware_length, width, height, vertical_offset = 2.5) {
    // We'll place everything in "real" X after we clamp a final stem length
    display_length = (hardware_length > 20) ? 20 : hardware_length;
    
    // The start of the main stem
    stemStart = [5, -1.25, 0];

    // We want to shorten the actual stem by 1.5 for the tip
    // Then clamp it to the same maxLen logic used in drawBoltStem
    maxLen    = 20 * Y_units;
    rawStem   = hardware_length - 1.5;  
    finalStem = (rawStem > maxLen) ? maxLen : rawStem;
    
    translate([-display_length/2 - 2, vertical_offset, height]) {
        // Head (top view)
        difference() {
            cylinder(h=text_height, d=5);
            // Phillips "plus"
            translate([-0.5, -2, 0]) cube([1, 4, text_height]);
            translate([-2, -0.5, 0]) cube([4, 1, text_height]);
        }

        // Countersunk side
        translate([5, 0, 0])
            cylinder(r=3, h=text_height, $fn=3);

        // Draw the stem with the same logic as drawBoltStem,
        // but using finalStem (the "shortened" length).
        // That means if rawStem is still bigger than maxLen,
        // it will be split within the function as well.
        drawBoltStem(rawStem, text_height, stemStart);

        // Place the tip exactly at the end of the final stem, not the full hardware_length
        translate([stemStart[0] + finalStem, 0, 0]) {
            linear_extrude(height=text_height)
                polygon(
                    points = [[0, 1.25],[2, 0],[0, -1.25]],
                    paths  = [[0, 1, 2]]
                );
        }
    }
}

//Torx wood screw 
module Torx_Wood_Screw(hardware_length, width, height, vertical_offset = 2.5) {
    // We'll place everything in "real" X after we clamp a final stem length
    display_length = (hardware_length > 20) ? 20 : hardware_length;
    
    // The start of the main stem
    stemStart = [5, -1.25, 0];

    // We want to shorten the actual stem by 1.5 for the tip
    // Then clamp it to the same maxLen logic used in drawBoltStem
    maxLen    = 20 * Y_units;
    rawStem   = hardware_length - 1.5;  
    finalStem = (rawStem > maxLen) ? maxLen : rawStem;
    
    translate([-display_length/2 - 2, vertical_offset, height]) {
        // top view (torx head)
        difference() {
            cylinder(h=text_height, d=5);
            Torx_star(6, 2, height=2, rnd=0.1);
        }

        // Countersunk side
        translate([5, 0, 0])
            cylinder(r=3, h=text_height, $fn=3);

        // Main stem (shortened by 1.5). We pass 'rawStem' so drawBoltStem can do the split if needed.
        drawBoltStem(rawStem, text_height, stemStart);

        // Place tip exactly at the end of that final stem
        translate([stemStart[0] + finalStem, 0, 0]) {
            linear_extrude(height=text_height)
                polygon(
                    points = [[0,  1.25],[2, 0],[0, -1.25]],
                    paths  = [[0, 1, 2]]
                );
        }
    }
}

//////////////////////////////////////////////////////////////
//                       TEXT MODULES                      //
//////////////////////////////////////////////////////////////
module bolt_text(diameter, Length, height) {
    translate([0, -3, height])
        linear_extrude(height=text_height)
            text(str(diameter, "x", Length),
                 size   = text_size,
                 font   = Font,
                 valign = "center",
                 halign = "center");
}

module nut_text(diameter, height) {
    translate([0, -3, height])
        linear_extrude(height=text_height)
            text(diameter, 
                 size   = text_size,
                 font   = Font,
                 valign = "center",
                 halign = "center");
}

module washer_text(diameter, height) {
    translate([0, -3, height])
        linear_extrude(height=text_height)
            text(diameter,
                 size   = text_size,
                 font   = Font,
                 valign = "center",
                 halign = "center");
}


//////////////////////////////////////////////////////////////
//                LABEL BASE SHAPE + CHAMFER               //
//////////////////////////////////////////////////////////////
module labelbase(length, width, height, radius, champfer) {
    // Extra perimeter shape
    translate([(-length - 2)/2, -5.7/2, 0]) {
        __shapeWithChampfer(
            length+2, 
            5.7, 
            height, 
            0.2, 
            champfer
        );
    }
    // Main label shape
    translate([(-length)/2, -width/2, 0]) {
        __shapeWithChampfer(
            length, 
            width, 
            height, 
            radius, 
            champfer
        );
    }
}

// shape with top/bottom chamfer
module __shapeWithChampfer(length, width, height, radius, champfer) {
    // bottom chamfer
    translate([0, 0, 0])
        __champfer(length, width, champfer, radius, flip=false);

    // main shape
    translate([0, 0, champfer])
        __shape(length, width, height - 2*champfer, radius);

    // top chamfer
    translate([0, 0, height - champfer])
        __champfer(length, width, champfer, radius, flip=true);
}

// side chamfer
module __champfer(length, width, size, radius, flip=false) {
    r1 = flip ? radius : radius - size;
    r2 = flip ? radius - size : radius;
    hull() {
        translate([radius, radius, 0])
            cylinder(h=size, r1=r1, r2=r2);
        translate([radius, width-radius, 0])
            cylinder(h=size, r1=r1, r2=r2);
        translate([length-radius, width-radius, 0])
            cylinder(h=size, r1=r1, r2=r2);
        translate([length-radius, radius, 0])
            cylinder(h=size, r1=r1, r2=r2);
    }
}

// main shape with rounded corners
module __shape(length, width, height, radius) {
    hull() {
        translate([radius, radius, 0])
            cylinder(h=height, r=radius);
        translate([radius, width-radius, 0])
            cylinder(h=height, r=radius);
        translate([length-radius, width-radius, 0])
            cylinder(h=height, r=radius);
        translate([length-radius, radius, 0])
            cylinder(h=height, r=radius);
    }
}
